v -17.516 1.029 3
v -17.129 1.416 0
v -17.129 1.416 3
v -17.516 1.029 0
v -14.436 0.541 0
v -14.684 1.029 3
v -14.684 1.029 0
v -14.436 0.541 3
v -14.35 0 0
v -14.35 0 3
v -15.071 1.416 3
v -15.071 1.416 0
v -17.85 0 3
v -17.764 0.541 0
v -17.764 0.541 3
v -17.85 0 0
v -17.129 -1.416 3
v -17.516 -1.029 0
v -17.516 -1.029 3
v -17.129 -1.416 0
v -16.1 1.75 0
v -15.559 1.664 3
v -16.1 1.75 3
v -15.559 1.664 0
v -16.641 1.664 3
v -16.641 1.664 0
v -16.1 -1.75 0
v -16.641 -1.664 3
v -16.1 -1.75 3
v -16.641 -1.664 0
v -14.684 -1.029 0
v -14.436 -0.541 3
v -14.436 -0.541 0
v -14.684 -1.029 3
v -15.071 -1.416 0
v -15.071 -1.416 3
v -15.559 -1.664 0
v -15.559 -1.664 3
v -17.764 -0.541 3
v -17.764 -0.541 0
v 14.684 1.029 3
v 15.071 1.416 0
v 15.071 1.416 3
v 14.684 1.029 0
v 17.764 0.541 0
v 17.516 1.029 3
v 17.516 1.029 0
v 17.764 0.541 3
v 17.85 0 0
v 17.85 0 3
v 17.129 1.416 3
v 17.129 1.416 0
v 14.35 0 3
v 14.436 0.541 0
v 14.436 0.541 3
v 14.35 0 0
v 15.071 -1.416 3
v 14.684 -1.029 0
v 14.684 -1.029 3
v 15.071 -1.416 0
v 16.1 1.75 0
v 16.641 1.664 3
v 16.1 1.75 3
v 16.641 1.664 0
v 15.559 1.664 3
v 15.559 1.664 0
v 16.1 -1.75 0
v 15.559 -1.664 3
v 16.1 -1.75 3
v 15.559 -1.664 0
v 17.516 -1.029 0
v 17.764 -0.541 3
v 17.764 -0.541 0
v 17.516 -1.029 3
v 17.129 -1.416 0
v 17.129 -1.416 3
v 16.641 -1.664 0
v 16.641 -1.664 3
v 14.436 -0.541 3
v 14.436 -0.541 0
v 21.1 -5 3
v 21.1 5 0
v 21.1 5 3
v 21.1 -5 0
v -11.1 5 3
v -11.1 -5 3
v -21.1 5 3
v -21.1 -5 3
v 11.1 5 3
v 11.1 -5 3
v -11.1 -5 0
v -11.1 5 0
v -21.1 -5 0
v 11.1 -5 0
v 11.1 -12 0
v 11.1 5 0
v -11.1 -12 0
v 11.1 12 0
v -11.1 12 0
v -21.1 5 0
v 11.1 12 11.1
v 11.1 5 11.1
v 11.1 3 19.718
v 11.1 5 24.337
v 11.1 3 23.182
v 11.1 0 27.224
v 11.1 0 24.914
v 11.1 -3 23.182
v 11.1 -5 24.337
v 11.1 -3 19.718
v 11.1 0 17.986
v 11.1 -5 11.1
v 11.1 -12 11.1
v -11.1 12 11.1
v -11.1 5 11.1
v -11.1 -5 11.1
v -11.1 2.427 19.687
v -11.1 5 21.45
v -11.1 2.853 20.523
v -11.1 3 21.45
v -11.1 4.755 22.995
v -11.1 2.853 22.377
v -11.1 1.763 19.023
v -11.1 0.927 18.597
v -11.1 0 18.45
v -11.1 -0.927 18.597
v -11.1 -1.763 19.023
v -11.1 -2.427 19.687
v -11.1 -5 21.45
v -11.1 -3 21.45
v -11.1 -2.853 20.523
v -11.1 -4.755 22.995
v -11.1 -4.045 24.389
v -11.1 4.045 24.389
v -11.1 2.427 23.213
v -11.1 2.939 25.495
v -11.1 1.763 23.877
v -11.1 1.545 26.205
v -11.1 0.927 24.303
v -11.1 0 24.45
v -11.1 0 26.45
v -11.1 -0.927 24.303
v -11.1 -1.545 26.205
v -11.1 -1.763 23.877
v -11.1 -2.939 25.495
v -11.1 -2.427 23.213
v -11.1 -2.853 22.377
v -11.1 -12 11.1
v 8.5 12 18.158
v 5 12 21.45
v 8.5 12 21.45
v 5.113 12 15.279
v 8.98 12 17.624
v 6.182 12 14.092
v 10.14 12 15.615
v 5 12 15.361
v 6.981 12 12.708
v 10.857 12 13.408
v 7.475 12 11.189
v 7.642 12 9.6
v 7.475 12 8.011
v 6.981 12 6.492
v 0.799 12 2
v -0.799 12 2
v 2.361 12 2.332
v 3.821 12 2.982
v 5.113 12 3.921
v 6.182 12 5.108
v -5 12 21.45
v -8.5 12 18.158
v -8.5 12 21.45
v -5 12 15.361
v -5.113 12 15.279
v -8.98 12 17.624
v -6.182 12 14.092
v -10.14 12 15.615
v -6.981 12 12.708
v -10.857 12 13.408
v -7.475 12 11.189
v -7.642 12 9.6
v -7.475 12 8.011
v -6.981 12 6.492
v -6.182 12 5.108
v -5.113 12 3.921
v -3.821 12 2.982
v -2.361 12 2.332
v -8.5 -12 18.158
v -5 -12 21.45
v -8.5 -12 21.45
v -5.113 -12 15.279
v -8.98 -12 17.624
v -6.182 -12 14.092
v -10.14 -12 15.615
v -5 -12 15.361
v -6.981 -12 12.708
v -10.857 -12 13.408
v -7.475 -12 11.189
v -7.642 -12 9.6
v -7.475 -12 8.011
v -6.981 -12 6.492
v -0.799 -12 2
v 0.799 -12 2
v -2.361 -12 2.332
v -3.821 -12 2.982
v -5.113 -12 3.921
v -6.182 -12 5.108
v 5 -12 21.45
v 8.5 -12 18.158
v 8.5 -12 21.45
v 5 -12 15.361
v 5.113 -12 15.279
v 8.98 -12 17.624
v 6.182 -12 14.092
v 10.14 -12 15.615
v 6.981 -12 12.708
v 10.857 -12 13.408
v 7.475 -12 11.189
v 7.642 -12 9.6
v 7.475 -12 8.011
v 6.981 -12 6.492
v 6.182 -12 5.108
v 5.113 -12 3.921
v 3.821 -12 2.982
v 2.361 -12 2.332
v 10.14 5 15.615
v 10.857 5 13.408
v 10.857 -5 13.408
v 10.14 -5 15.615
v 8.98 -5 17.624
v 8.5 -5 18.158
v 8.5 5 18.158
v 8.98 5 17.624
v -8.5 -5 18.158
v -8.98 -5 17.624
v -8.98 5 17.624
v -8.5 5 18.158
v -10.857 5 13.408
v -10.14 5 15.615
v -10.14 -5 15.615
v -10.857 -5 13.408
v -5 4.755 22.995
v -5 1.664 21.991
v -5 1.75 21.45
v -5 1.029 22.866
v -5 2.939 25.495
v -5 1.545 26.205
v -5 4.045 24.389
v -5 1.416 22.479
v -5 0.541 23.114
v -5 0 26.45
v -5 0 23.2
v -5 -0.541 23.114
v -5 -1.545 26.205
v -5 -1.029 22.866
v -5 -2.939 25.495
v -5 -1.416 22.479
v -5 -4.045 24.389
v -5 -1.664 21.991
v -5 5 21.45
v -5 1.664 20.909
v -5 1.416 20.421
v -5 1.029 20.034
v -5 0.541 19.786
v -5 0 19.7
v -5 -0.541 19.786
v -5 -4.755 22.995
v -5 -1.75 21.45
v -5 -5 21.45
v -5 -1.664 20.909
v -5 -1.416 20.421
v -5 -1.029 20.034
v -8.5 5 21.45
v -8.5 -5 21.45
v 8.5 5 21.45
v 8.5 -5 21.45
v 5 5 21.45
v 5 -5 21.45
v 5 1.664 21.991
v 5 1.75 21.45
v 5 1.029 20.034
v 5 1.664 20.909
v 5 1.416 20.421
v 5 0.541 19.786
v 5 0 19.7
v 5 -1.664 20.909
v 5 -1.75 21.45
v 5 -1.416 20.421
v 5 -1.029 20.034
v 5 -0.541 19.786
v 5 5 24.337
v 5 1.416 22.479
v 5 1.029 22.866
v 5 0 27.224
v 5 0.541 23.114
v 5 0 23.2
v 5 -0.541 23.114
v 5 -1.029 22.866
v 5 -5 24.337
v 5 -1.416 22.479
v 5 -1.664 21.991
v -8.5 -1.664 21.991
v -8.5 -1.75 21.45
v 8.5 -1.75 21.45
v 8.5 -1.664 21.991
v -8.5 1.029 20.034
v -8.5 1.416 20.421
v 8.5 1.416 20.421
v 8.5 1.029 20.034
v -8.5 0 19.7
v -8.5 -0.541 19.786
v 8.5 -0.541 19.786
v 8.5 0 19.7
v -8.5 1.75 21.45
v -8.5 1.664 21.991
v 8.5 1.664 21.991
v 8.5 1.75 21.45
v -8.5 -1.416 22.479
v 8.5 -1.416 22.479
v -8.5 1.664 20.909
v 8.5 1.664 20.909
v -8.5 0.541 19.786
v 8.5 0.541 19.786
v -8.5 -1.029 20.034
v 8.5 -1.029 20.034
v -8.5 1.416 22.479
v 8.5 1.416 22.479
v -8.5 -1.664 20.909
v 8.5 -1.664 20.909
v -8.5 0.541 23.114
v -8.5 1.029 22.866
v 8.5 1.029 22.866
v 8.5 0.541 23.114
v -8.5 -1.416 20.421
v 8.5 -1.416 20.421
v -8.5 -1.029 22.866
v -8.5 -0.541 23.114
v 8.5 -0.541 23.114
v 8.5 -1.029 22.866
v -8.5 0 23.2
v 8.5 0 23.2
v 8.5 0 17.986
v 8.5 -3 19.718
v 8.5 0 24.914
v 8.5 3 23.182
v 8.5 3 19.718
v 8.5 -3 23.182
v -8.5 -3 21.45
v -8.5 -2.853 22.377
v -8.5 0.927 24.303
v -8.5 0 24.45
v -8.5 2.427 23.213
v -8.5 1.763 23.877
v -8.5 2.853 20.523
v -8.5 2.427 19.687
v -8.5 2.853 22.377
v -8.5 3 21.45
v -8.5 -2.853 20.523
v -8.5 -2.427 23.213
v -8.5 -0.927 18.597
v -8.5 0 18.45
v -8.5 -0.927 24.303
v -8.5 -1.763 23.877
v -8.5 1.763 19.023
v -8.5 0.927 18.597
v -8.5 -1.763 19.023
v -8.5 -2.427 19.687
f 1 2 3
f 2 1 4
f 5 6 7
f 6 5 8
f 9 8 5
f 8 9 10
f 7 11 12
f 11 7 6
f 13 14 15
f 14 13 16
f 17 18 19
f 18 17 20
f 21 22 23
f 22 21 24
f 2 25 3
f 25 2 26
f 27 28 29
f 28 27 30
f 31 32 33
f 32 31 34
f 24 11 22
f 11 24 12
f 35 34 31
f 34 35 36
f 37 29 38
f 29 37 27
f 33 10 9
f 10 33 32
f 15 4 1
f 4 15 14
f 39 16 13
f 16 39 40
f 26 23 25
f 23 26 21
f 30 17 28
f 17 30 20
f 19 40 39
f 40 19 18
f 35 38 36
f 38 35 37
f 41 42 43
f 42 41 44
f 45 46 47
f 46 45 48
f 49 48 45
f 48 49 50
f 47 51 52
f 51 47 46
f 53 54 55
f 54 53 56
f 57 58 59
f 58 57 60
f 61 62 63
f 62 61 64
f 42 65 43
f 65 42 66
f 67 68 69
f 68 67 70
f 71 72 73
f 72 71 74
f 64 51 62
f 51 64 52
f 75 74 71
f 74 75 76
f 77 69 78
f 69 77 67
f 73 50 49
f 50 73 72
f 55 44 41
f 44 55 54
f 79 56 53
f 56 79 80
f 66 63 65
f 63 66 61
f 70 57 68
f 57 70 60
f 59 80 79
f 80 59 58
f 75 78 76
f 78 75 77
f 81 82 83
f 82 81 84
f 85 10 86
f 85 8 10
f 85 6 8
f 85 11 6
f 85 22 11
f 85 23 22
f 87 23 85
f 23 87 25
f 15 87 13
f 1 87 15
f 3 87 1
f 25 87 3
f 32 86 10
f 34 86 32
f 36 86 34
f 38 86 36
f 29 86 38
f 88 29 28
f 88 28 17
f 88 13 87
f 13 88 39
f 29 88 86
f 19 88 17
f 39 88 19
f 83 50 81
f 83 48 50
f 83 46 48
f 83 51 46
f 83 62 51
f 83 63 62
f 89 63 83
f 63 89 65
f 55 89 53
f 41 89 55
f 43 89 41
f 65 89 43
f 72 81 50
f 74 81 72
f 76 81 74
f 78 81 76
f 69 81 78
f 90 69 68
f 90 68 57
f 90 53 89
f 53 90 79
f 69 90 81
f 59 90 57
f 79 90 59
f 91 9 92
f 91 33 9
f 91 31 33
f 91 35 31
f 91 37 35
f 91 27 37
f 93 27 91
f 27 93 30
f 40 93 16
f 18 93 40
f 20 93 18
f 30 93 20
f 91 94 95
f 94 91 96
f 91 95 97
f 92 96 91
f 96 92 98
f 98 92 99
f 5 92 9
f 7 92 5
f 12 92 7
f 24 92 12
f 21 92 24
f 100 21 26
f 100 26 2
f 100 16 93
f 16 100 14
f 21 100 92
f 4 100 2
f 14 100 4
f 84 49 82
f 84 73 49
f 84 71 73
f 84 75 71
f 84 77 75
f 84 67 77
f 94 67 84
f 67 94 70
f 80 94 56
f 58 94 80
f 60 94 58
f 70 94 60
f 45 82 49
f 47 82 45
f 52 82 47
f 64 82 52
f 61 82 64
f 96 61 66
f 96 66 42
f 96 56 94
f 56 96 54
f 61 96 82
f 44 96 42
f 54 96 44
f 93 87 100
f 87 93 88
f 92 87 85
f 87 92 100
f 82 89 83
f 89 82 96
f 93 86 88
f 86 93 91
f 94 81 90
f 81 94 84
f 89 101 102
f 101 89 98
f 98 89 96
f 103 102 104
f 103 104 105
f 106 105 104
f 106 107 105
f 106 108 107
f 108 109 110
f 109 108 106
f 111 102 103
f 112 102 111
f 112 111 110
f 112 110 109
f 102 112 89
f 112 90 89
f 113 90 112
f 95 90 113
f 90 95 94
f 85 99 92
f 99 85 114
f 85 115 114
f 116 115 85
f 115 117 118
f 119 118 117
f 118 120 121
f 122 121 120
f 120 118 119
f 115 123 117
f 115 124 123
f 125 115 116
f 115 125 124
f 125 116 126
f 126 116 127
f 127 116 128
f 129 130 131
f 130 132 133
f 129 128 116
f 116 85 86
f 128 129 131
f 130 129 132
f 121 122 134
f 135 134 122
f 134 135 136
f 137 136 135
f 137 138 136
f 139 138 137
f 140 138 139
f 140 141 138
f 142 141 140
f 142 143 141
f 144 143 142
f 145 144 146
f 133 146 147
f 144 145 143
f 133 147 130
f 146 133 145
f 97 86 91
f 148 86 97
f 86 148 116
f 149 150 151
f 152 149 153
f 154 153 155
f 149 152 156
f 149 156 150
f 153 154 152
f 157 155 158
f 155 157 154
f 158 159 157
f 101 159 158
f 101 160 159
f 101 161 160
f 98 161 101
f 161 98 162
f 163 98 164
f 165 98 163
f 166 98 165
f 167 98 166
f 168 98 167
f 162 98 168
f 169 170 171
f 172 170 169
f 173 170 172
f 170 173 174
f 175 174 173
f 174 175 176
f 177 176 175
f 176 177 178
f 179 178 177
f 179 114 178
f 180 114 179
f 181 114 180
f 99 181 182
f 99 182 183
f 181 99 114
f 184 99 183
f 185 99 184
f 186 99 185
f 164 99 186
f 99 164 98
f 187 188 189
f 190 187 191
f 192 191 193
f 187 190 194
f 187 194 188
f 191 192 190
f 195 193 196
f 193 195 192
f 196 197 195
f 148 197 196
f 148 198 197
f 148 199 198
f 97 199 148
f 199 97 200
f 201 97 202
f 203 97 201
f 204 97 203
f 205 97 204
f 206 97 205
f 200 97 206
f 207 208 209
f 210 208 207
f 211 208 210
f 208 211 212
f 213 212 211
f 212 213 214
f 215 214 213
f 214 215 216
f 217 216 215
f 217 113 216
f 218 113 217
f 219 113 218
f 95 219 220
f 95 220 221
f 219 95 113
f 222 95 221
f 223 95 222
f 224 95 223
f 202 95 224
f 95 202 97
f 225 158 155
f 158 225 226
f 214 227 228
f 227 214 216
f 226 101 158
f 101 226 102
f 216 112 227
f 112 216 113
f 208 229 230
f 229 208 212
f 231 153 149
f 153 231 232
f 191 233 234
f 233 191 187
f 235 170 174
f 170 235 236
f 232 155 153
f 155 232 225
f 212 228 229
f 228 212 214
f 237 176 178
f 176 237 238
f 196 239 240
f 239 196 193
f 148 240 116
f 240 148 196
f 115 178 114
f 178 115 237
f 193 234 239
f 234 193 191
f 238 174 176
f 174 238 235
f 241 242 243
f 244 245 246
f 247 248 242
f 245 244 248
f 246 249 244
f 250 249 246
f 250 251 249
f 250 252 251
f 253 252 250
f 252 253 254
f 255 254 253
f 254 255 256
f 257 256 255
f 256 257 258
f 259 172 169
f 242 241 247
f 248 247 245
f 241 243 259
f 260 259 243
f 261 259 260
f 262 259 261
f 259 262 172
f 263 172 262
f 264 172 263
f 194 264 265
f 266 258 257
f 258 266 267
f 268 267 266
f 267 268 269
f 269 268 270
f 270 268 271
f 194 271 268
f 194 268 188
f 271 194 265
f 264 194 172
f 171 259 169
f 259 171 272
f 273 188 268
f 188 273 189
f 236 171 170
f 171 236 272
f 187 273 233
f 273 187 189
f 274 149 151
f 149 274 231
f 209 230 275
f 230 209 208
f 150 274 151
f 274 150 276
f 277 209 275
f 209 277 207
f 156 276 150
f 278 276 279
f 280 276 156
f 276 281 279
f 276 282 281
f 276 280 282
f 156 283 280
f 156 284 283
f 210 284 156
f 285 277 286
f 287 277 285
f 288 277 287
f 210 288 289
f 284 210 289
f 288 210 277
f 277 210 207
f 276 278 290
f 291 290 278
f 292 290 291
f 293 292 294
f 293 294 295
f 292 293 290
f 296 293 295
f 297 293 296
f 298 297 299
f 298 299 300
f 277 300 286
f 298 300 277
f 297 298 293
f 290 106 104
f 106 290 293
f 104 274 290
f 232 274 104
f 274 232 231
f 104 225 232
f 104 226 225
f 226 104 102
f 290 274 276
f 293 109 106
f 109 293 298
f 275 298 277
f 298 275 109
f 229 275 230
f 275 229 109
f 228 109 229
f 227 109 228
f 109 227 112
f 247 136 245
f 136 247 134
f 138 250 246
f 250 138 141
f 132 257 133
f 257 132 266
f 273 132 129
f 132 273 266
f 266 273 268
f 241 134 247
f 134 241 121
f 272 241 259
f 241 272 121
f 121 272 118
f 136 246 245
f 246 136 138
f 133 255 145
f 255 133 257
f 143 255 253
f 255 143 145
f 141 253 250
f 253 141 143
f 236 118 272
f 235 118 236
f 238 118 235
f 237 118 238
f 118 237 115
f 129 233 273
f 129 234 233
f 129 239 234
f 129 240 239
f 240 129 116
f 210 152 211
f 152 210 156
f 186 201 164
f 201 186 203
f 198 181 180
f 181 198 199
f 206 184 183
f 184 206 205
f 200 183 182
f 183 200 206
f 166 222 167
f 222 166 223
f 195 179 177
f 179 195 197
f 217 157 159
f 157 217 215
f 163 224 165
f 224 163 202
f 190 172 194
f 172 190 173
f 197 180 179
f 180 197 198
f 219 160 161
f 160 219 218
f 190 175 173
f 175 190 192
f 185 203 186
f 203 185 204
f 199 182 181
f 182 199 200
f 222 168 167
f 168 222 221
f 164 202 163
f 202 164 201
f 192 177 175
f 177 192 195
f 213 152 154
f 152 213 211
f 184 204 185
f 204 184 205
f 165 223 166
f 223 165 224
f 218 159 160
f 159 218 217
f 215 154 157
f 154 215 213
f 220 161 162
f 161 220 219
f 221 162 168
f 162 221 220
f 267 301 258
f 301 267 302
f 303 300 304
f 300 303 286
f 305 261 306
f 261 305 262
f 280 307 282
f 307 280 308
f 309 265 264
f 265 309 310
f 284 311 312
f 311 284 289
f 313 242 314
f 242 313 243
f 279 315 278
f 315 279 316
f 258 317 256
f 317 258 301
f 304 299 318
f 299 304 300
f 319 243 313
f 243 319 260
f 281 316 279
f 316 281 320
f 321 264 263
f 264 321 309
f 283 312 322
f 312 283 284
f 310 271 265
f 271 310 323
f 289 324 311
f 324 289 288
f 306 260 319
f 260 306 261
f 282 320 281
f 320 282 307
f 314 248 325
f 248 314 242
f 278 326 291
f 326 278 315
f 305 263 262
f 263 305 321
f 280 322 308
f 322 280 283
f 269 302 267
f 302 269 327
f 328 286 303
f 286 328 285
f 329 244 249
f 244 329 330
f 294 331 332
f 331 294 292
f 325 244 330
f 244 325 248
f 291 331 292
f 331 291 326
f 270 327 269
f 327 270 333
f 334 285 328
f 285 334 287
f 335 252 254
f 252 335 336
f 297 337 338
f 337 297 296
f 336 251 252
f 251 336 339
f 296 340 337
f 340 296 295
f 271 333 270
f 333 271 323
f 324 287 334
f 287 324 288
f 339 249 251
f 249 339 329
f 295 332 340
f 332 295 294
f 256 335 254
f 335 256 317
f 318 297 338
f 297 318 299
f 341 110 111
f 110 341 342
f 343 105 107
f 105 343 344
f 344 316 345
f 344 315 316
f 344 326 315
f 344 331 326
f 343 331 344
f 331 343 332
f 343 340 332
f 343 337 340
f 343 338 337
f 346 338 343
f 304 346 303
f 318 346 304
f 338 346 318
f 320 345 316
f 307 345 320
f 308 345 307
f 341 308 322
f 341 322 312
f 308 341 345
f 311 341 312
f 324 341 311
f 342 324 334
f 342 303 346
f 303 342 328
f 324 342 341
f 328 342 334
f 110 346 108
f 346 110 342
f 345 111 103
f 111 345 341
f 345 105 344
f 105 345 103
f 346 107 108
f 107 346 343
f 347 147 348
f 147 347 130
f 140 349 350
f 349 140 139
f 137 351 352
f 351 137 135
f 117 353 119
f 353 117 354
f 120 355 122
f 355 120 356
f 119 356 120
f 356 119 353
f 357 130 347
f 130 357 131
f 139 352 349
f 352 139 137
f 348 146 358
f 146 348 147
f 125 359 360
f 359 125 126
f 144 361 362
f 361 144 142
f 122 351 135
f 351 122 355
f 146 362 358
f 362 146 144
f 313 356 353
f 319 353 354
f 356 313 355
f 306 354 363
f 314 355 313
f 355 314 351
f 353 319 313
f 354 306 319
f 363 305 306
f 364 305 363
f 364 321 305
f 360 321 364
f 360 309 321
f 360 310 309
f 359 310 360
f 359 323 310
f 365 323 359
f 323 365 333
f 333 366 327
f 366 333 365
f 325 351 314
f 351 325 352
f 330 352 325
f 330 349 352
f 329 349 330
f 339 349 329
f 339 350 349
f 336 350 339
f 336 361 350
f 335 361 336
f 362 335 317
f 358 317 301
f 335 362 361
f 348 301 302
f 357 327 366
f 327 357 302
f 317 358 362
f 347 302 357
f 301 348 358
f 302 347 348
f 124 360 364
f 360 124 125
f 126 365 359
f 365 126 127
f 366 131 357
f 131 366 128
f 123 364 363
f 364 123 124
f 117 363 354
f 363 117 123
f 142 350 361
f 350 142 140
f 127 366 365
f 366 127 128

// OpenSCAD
// LM8UU holder slim v1.1
// *********************************************
// Jonas Kühling
// http://www.jonaskuehling.de
// http://www.thingiverse.com/jonaskuehling
// *********************************************
// derived from:
// http://www.thingiverse.com/thing:14942

// LM8UU/rod dimensions
LM8UU_dia = 15.2;
LM8UU_length = 24;
rod_dia = 8;

//screw/nut dimensions (M3) - hexagon socket head cap screw ISO 4762, hexagon nut ISO 4032
screw_thread_dia_iso = 3;
screw_head_dia_iso = 5.5;
nut_wrench_size_iso = 5.5;


// screw/nut dimensions for use (plus clearance for fitting purpose)
clearance_dia = 0.5;
screw_thread_dia = screw_thread_dia_iso + clearance_dia;
screw_head_dia = screw_head_dia_iso + clearance_dia;
nut_wrench_size = nut_wrench_size_iso + clearance_dia;
nut_dia_perimeter = (nut_wrench_size/cos(30));
nut_dia = nut_dia_perimeter;
nut_surround_thickness = 2;

// main body dimensions
body_wall_thickness = 3.5;
body_width = LM8UU_dia + (2*body_wall_thickness);
body_height = body_width;
body_length = LM8UU_length;
gap_width = rod_dia + 2;
screw_bushing_space = 1;
screw_elevation = LM8UU_dia + body_wall_thickness + (screw_thread_dia/2) +screw_bushing_space;

// TEST - uncomment to render in openscad:
lm8uu_holder(1);		// WITH mountplate
// lm8uu_holder();		// WITHOUT mountplate


// nophead's polyhole module for better lm8uu-fit
module polyhole(d,h) {
    n = max(round(2 * d),3);
    rotate([0,0,180])
        cylinder(h = h, r = (d / 2) / cos (180 / n), $fn = n);
}


module mount_plate()
{
	difference()
	{
		translate([0,0,1.5])
		cube([body_width+2*screw_head_dia+4*nut_surround_thickness,screw_head_dia+2*nut_surround_thickness,3], center=true);

		for(i=[-1,1])
			translate([i*(body_width/2+nut_surround_thickness+screw_head_dia/2),0,-0.5])
				cylinder(r=screw_thread_dia/2, h=4, $fn=20);
	}
}

// main body
module lm8uu_holder(with_mountplate=false)
{
	difference()
	{
		union()
		{
			if (with_mountplate) 
			mount_plate();
	
			// body
			translate([0,0,body_height/4])
				cube([body_width,body_length,body_height/2], center=true);
			translate([0,0,(LM8UU_dia/2)+body_wall_thickness])		
				rotate([90,0,0])
					cylinder(r=(LM8UU_dia/2)+body_wall_thickness, h=LM8UU_length, center=true);
	
			// gap support
			translate([-(gap_width/2)-body_wall_thickness,-(body_length/2),body_height/2])
				cube([body_wall_thickness,LM8UU_length,(LM8UU_dia/2)+screw_bushing_space+(screw_thread_dia/2)]);
			translate([gap_width/2,-(body_length/2),body_height/2])
				cube([body_wall_thickness,LM8UU_length,(LM8UU_dia/2)+screw_bushing_space+(screw_thread_dia/2)]);
	
	
			// nut trap surround
			translate([gap_width/2,0,screw_elevation])
				rotate([0,90,0])
					cylinder(r=(((nut_wrench_size+nut_surround_thickness*2)/cos(30))/2), h=(body_width-gap_width)/2, $fn=6);
			translate([gap_width/2+(body_width-gap_width)/4,0,screw_elevation/2])
				cube([(body_width-gap_width)/2,nut_wrench_size+(nut_surround_thickness*2),screw_elevation],center=true);

			// Screw hole surround
			translate([-gap_width/2,0,screw_elevation])
				rotate([0,-90,0])
					cylinder(r=(screw_head_dia/2)+nut_surround_thickness, h=(body_width-gap_width)/2, $fn=20);
			translate([-(gap_width/2+(body_width-gap_width)/4),0,screw_elevation/2])
				cube([(body_width-gap_width)/2,screw_head_dia+(nut_surround_thickness*2),screw_elevation],center=true);
		}
	
		// bushing hole
		translate([0,0,LM8UU_dia/2+2])
			rotate([90,0,0])
//				cylinder(r=LM8UU_dia/2, h=LM8UU_length+1, center=true);
				translate([0,0,-(LM8UU_length+1)/2]) polyhole(LM8UU_dia,LM8UU_length+1);	// TESTING POLYHOLE MODULE FOR BETTER LM8UU FIT
	
		// top gap
		translate([-(gap_width/2),-(body_length/2)-1,body_height/2])
			cube([gap_width,LM8UU_length+2,(LM8UU_dia/2)+screw_bushing_space+(screw_thread_dia/2)+(nut_dia/2)+nut_surround_thickness+1]);
	
		// screw hole (one all the way through)
		translate([0,0,screw_elevation])
			rotate([0,90,0])
				cylinder(r=screw_thread_dia/2, h=body_width+3, center=true, $fn=20);
	
		// nut trap
		translate([gap_width/2+body_wall_thickness,0,screw_elevation])
			rotate([0,90,0])
				cylinder(r=nut_dia/2, h=body_width/2-gap_width/2-body_wall_thickness+1,$fn=6);
	
		// screw head hole
		translate([-(gap_width)/2-body_wall_thickness,0,screw_elevation])
			rotate([0,-90,0])
				cylinder(r=screw_head_dia/2, h=body_width/2-gap_width/2-body_wall_thickness+1,$fn=20);
	
	}
}
